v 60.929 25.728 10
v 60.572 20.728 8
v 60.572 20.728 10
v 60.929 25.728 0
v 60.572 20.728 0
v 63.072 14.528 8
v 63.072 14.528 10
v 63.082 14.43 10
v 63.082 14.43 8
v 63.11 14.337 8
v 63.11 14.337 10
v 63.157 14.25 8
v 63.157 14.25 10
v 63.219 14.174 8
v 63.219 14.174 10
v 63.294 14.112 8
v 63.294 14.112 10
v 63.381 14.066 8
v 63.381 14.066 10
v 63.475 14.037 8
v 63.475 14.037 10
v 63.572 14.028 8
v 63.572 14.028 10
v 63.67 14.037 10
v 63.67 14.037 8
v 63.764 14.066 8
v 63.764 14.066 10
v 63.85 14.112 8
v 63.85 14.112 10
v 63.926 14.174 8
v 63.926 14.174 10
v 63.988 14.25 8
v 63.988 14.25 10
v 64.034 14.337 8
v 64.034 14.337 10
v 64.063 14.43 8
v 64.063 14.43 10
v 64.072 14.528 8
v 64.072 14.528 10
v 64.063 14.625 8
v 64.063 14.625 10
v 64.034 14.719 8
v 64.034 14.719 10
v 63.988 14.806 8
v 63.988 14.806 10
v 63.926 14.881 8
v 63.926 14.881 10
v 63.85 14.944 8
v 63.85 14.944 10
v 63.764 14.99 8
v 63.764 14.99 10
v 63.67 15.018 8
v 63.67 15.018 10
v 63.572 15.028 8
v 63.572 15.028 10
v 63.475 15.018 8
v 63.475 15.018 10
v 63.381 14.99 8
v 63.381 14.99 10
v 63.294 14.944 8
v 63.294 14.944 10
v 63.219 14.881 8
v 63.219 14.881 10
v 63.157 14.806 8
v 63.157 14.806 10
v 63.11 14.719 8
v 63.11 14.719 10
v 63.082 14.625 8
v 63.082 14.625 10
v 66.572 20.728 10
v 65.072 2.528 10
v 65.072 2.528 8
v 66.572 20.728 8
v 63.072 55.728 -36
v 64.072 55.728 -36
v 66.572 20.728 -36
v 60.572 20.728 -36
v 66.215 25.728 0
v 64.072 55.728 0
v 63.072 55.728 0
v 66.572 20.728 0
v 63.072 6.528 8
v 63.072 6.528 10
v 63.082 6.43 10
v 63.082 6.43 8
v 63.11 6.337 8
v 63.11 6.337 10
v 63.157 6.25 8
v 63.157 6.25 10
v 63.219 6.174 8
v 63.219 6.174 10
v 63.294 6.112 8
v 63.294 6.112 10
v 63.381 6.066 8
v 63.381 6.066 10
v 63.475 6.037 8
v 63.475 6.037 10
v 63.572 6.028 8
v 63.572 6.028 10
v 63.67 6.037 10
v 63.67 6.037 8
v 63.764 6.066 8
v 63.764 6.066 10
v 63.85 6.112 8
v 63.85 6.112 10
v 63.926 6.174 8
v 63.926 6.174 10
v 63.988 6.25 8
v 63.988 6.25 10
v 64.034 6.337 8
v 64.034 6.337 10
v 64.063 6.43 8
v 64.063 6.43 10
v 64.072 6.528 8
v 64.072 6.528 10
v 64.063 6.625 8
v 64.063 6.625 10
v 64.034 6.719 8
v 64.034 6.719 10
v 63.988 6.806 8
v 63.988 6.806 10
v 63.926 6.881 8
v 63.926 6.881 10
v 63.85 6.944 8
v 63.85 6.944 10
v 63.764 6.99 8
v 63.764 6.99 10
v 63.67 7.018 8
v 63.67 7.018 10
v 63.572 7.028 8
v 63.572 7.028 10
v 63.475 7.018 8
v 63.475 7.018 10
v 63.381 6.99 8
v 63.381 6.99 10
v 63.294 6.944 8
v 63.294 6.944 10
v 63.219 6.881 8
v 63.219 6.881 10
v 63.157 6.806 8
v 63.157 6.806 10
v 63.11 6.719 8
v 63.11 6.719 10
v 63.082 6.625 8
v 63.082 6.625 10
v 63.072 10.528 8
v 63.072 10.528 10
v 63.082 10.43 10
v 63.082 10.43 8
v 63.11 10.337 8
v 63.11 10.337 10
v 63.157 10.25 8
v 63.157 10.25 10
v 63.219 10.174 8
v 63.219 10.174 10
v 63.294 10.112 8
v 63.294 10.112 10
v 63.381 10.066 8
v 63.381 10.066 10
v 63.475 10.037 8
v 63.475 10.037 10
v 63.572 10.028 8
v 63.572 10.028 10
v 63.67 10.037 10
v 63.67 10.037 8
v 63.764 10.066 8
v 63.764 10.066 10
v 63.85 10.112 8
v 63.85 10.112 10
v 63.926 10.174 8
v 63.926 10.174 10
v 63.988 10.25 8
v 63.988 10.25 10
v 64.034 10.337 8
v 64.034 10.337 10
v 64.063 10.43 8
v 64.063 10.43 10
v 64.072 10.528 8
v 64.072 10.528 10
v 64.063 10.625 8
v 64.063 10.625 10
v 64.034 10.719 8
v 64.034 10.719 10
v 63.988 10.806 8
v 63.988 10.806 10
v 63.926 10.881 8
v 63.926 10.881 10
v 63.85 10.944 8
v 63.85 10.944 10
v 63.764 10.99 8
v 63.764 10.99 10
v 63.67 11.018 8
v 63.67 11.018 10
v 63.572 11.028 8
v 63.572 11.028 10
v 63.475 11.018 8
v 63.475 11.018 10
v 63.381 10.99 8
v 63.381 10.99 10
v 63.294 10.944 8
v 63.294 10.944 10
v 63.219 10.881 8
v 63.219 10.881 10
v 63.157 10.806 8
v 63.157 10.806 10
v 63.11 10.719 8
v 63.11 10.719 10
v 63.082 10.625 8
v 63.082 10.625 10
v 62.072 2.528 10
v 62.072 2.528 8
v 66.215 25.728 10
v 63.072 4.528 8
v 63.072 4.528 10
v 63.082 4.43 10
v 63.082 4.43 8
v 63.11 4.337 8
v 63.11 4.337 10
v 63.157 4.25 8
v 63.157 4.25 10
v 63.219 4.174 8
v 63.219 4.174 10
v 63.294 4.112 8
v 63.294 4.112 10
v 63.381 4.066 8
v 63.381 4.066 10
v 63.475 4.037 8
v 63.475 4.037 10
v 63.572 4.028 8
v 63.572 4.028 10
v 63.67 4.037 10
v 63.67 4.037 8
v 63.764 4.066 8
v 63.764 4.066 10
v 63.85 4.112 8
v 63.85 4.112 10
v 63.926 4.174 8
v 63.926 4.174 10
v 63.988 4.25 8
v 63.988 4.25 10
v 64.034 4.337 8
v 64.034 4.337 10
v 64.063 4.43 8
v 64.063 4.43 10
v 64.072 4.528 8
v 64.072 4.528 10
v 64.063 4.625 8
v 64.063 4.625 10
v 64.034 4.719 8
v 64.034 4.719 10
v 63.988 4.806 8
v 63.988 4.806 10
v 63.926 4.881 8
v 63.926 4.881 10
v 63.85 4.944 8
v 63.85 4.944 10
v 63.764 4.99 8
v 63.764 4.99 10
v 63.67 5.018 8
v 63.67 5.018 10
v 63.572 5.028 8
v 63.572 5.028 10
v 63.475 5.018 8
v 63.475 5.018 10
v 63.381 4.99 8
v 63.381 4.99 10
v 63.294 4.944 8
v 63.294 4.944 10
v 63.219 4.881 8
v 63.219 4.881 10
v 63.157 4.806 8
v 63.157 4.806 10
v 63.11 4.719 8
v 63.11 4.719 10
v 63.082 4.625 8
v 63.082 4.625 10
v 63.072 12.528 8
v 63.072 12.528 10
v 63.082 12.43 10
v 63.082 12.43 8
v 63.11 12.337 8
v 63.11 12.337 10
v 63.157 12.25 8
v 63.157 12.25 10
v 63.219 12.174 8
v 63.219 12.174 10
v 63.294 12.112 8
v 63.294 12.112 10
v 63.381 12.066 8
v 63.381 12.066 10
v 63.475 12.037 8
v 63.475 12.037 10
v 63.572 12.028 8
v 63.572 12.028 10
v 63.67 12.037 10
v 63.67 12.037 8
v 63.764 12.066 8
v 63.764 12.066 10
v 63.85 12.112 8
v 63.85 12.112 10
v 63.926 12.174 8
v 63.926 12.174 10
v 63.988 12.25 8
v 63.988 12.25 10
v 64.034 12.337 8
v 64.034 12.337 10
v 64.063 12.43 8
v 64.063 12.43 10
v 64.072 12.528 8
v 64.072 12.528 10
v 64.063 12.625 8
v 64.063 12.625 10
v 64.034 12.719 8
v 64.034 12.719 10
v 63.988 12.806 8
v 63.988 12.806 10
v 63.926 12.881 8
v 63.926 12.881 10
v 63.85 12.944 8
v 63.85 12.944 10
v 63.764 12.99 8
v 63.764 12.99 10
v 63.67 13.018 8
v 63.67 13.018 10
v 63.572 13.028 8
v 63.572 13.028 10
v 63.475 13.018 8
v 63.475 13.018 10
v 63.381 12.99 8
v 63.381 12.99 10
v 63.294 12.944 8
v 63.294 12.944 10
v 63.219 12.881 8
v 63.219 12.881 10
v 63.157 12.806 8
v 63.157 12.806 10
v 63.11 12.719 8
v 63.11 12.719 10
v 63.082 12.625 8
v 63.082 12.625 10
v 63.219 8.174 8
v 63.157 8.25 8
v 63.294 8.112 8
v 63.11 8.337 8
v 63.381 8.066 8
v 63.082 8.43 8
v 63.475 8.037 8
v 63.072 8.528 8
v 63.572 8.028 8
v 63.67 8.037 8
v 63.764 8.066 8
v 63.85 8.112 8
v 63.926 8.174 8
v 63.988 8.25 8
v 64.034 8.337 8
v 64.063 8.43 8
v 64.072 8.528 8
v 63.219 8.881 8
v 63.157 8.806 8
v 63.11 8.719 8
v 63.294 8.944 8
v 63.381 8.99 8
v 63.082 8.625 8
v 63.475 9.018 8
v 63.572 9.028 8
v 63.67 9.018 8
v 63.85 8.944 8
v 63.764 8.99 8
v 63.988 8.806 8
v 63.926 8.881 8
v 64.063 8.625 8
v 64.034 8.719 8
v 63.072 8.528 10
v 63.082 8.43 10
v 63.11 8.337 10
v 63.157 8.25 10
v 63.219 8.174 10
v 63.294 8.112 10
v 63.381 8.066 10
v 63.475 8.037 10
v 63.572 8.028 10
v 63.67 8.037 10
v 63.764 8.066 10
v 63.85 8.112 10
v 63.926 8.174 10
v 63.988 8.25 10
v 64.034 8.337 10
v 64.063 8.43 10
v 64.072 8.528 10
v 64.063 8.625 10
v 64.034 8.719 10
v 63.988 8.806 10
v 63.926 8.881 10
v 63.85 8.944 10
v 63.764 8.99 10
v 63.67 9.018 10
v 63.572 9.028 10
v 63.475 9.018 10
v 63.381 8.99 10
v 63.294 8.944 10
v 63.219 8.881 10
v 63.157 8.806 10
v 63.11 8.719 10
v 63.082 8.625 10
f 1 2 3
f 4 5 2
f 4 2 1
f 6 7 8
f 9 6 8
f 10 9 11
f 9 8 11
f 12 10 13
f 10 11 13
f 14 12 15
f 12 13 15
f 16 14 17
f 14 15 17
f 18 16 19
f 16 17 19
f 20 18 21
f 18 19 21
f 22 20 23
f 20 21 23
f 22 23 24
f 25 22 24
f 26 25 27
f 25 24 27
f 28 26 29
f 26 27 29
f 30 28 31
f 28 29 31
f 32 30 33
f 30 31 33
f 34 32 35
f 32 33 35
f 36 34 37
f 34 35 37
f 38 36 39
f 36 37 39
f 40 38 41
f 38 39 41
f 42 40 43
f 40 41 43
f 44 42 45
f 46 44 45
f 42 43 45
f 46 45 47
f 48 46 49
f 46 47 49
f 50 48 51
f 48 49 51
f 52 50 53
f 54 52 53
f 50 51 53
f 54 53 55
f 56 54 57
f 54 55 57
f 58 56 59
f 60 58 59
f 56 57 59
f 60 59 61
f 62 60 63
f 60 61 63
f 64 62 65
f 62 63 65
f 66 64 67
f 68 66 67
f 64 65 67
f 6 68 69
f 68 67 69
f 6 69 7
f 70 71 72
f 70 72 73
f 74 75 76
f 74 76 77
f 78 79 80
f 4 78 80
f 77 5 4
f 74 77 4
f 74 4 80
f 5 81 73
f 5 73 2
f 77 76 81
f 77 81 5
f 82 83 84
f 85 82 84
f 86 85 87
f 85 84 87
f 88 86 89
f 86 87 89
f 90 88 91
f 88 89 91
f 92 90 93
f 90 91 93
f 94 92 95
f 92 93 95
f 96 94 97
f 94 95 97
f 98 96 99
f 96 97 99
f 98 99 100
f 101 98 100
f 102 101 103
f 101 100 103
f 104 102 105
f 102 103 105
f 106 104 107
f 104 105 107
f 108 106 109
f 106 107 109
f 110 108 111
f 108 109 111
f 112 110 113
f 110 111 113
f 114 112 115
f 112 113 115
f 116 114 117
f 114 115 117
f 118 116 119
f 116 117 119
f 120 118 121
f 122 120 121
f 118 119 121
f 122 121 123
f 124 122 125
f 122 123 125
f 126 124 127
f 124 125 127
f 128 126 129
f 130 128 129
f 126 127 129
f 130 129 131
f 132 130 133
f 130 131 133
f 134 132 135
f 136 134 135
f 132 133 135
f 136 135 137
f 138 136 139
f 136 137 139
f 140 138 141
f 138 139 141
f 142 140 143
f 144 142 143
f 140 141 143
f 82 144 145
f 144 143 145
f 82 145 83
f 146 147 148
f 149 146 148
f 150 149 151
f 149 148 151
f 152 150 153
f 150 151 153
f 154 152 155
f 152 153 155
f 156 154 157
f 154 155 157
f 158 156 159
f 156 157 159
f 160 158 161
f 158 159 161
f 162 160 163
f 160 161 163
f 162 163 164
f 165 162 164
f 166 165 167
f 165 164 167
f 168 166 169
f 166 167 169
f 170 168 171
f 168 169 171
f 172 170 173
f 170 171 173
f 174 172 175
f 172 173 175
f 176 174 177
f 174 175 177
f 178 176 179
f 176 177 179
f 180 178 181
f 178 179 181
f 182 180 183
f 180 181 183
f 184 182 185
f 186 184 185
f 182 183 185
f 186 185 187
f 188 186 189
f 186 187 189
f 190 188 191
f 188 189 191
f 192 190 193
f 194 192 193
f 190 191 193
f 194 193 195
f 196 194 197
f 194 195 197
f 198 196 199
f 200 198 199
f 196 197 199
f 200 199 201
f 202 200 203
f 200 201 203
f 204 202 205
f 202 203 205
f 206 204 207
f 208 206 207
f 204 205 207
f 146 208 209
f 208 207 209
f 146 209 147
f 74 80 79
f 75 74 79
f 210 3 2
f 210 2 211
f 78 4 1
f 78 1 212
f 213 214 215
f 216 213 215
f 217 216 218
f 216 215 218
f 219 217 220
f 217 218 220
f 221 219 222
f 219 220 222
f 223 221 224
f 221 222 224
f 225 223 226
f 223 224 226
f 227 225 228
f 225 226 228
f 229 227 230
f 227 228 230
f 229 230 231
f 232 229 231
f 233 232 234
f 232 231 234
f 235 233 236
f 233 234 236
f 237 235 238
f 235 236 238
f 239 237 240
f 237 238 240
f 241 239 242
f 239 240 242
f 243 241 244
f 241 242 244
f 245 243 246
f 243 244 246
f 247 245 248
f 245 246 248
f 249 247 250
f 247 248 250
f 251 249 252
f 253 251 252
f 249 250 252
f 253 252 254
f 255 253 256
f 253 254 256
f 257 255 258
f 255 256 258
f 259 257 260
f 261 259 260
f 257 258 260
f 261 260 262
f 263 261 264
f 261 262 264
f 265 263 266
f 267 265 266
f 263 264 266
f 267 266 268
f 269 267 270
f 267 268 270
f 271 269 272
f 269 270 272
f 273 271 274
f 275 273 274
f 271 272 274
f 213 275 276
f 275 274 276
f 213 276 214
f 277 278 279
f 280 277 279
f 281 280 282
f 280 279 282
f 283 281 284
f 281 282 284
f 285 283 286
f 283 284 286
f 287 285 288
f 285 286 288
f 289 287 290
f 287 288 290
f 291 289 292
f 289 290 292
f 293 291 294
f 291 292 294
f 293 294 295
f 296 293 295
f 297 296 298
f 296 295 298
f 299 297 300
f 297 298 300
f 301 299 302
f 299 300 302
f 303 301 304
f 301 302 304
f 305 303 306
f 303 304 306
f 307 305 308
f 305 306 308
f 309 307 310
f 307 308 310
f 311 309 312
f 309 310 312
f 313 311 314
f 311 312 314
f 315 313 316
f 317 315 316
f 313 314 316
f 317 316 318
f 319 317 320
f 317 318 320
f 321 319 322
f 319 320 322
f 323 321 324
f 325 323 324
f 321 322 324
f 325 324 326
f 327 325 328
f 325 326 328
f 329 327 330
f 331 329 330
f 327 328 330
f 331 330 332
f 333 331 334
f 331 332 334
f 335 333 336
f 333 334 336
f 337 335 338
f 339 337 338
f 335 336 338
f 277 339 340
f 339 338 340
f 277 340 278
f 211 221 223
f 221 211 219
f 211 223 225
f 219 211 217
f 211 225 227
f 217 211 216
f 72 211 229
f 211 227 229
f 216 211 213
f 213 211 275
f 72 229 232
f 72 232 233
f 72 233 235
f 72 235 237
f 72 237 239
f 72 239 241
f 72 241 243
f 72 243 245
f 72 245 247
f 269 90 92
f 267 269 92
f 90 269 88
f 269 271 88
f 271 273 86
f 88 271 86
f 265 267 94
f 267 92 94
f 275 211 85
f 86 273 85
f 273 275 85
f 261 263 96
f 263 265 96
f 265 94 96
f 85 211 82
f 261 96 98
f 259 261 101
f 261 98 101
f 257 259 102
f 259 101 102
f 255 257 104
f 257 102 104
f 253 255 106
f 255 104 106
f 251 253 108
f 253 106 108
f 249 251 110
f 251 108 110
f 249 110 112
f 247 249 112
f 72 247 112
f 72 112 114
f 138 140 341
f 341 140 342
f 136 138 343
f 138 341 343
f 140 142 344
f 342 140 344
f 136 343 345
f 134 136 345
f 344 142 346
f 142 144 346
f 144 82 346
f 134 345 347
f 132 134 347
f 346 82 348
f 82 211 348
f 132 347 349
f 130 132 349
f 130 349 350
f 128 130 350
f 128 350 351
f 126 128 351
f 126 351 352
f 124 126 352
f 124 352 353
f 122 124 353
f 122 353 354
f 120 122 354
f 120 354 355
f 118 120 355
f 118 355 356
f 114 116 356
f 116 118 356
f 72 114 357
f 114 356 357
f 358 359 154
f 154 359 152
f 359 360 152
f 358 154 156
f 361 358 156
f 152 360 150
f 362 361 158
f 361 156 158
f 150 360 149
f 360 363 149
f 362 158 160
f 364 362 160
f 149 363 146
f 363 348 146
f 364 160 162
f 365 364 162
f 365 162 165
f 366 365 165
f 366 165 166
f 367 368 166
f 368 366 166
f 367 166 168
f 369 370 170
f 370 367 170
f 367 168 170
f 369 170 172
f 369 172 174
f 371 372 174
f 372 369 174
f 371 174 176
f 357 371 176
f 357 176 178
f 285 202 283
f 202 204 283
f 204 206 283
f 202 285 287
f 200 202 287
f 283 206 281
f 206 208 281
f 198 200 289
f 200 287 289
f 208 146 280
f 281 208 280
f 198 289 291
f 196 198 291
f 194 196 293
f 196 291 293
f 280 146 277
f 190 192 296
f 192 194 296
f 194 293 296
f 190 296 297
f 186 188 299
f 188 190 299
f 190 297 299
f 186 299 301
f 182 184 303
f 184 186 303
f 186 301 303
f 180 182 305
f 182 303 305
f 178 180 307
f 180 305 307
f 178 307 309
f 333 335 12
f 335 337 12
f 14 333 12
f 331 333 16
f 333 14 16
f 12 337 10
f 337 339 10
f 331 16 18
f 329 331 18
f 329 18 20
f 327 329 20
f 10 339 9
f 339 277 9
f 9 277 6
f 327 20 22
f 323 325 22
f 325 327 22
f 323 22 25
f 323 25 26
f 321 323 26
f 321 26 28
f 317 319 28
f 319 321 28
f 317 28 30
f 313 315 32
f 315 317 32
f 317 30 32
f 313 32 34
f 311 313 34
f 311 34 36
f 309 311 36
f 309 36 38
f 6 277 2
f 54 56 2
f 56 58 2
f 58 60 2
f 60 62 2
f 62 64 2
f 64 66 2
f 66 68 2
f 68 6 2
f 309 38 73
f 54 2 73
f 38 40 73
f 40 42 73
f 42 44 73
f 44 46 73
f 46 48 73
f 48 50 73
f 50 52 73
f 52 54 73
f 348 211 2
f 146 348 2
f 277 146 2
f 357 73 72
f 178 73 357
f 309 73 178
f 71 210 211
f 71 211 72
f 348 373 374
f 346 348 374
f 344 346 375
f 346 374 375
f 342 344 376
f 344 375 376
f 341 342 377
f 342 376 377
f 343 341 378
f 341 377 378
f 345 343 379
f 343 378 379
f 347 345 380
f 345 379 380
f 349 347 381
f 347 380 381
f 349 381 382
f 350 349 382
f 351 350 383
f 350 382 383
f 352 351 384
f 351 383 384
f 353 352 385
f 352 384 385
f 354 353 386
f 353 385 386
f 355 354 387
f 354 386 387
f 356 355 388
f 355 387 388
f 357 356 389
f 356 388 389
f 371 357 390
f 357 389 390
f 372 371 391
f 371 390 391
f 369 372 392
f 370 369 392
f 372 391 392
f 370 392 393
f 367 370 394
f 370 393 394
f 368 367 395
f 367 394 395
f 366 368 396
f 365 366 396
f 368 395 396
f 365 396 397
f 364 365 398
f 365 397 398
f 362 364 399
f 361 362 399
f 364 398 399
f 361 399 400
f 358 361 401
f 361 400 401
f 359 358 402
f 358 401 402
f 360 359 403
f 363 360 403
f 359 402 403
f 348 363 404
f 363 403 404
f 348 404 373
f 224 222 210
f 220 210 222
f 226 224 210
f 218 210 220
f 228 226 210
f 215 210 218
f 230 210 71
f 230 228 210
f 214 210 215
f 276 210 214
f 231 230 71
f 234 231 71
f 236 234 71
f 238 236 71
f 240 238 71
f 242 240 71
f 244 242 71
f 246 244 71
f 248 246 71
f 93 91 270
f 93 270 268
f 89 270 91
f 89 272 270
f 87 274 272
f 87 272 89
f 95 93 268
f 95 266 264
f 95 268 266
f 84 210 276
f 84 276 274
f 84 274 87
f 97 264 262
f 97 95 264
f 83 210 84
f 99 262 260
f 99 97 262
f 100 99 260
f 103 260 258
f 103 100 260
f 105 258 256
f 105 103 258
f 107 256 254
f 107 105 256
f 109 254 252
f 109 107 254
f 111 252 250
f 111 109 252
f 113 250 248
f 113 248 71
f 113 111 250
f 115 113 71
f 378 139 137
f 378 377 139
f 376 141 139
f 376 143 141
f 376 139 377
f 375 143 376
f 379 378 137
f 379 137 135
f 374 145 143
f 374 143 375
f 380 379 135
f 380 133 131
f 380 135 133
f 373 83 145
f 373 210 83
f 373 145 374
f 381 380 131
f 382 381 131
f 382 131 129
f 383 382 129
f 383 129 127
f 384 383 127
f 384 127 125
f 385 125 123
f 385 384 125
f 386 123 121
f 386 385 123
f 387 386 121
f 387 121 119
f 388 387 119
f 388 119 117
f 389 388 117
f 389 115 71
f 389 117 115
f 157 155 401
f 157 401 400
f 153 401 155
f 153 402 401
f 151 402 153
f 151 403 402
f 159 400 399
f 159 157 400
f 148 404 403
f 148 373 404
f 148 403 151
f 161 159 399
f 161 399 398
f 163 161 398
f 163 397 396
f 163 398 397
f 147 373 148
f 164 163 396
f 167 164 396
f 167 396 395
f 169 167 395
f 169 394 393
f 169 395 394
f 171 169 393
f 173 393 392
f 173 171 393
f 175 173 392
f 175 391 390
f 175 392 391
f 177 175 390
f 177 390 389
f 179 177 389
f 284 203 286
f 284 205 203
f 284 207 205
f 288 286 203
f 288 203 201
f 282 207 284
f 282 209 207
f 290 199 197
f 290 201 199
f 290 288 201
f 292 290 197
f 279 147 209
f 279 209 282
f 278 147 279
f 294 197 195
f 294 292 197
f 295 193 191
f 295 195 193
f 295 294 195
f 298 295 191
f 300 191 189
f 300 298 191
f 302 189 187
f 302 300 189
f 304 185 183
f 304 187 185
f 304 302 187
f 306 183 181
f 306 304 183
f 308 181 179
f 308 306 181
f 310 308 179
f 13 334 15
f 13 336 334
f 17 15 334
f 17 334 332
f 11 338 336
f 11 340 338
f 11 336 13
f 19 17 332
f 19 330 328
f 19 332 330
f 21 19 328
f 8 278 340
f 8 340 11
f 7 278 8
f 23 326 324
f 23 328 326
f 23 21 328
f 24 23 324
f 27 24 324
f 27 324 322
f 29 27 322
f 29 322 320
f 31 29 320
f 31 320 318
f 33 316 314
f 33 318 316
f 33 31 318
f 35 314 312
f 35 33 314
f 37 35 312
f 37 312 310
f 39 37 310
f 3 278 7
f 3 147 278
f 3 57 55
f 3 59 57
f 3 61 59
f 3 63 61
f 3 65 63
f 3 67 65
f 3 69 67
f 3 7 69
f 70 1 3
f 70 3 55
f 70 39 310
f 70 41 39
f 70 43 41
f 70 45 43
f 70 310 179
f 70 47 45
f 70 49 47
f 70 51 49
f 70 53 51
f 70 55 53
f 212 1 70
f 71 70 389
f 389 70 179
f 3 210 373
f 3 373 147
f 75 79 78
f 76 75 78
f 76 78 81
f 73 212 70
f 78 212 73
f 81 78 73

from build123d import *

# Parameters (mm, degrees)
BOSS_EXTRUDE1_DEPTH = 36
BOSS_EXTRUDE3_DEPTH = 10
SKETCH4_R           = 0.5
BOSS_EXTRUDE4_DEPTH = 2


with BuildPart() as part:
    # Sketch1 → Boss-Extrude1 (new body)
    with BuildSketch(Plane.XY):
        Polygon((63.072235962, 55.72786335), (64.072235962, 55.72786335), (66.572235962, 20.72786335), (60.572235962, 20.72786335), align=None)
    extrude(amount=-BOSS_EXTRUDE1_DEPTH)

    # Sketch3 → Boss-Extrude3 (add)
    with BuildSketch(Plane.XY):
        Polygon((60.572235962, 20.72786335), (60.929378819, 25.72786335), (66.215093105, 25.72786335), (66.572235962, 20.72786335), align=None)
    extrude(amount=BOSS_EXTRUDE3_DEPTH)

    # Sketch4 → Boss-Extrude4 (add)
    with BuildSketch(Plane.XY.offset(10)):
        Polygon((66.572235962, 20.72786335), (60.572235962, 20.72786335), (62.072235962, 2.52786335), (65.072235962, 2.52786335), align=None)
        with Locations(Location((63.572235962, 14.52786335, 0), (0, 0, 180))):
            Circle(SKETCH4_R, mode=Mode.SUBTRACT)
        with Locations(Location((63.572235962, 12.52786335, 0), (0, 0, 180))):
            Circle(SKETCH4_R, mode=Mode.SUBTRACT)
        with Locations(Location((63.572235962, 10.52786335, 0), (0, 0, 180))):
            Circle(SKETCH4_R, mode=Mode.SUBTRACT)
        with Locations(Location((63.572235962, 8.52786335, 0), (0, 0, 180))):
            Circle(SKETCH4_R, mode=Mode.SUBTRACT)
        with Locations(Location((63.572235962, 4.52786335, 0), (0, 0, 180))):
            Circle(SKETCH4_R, mode=Mode.SUBTRACT)
        with Locations(Location((63.572235962, 6.52786335, 0), (0, 0, 180))):
            Circle(SKETCH4_R, mode=Mode.SUBTRACT)
    extrude(amount=-BOSS_EXTRUDE4_DEPTH)


solid = part.part
